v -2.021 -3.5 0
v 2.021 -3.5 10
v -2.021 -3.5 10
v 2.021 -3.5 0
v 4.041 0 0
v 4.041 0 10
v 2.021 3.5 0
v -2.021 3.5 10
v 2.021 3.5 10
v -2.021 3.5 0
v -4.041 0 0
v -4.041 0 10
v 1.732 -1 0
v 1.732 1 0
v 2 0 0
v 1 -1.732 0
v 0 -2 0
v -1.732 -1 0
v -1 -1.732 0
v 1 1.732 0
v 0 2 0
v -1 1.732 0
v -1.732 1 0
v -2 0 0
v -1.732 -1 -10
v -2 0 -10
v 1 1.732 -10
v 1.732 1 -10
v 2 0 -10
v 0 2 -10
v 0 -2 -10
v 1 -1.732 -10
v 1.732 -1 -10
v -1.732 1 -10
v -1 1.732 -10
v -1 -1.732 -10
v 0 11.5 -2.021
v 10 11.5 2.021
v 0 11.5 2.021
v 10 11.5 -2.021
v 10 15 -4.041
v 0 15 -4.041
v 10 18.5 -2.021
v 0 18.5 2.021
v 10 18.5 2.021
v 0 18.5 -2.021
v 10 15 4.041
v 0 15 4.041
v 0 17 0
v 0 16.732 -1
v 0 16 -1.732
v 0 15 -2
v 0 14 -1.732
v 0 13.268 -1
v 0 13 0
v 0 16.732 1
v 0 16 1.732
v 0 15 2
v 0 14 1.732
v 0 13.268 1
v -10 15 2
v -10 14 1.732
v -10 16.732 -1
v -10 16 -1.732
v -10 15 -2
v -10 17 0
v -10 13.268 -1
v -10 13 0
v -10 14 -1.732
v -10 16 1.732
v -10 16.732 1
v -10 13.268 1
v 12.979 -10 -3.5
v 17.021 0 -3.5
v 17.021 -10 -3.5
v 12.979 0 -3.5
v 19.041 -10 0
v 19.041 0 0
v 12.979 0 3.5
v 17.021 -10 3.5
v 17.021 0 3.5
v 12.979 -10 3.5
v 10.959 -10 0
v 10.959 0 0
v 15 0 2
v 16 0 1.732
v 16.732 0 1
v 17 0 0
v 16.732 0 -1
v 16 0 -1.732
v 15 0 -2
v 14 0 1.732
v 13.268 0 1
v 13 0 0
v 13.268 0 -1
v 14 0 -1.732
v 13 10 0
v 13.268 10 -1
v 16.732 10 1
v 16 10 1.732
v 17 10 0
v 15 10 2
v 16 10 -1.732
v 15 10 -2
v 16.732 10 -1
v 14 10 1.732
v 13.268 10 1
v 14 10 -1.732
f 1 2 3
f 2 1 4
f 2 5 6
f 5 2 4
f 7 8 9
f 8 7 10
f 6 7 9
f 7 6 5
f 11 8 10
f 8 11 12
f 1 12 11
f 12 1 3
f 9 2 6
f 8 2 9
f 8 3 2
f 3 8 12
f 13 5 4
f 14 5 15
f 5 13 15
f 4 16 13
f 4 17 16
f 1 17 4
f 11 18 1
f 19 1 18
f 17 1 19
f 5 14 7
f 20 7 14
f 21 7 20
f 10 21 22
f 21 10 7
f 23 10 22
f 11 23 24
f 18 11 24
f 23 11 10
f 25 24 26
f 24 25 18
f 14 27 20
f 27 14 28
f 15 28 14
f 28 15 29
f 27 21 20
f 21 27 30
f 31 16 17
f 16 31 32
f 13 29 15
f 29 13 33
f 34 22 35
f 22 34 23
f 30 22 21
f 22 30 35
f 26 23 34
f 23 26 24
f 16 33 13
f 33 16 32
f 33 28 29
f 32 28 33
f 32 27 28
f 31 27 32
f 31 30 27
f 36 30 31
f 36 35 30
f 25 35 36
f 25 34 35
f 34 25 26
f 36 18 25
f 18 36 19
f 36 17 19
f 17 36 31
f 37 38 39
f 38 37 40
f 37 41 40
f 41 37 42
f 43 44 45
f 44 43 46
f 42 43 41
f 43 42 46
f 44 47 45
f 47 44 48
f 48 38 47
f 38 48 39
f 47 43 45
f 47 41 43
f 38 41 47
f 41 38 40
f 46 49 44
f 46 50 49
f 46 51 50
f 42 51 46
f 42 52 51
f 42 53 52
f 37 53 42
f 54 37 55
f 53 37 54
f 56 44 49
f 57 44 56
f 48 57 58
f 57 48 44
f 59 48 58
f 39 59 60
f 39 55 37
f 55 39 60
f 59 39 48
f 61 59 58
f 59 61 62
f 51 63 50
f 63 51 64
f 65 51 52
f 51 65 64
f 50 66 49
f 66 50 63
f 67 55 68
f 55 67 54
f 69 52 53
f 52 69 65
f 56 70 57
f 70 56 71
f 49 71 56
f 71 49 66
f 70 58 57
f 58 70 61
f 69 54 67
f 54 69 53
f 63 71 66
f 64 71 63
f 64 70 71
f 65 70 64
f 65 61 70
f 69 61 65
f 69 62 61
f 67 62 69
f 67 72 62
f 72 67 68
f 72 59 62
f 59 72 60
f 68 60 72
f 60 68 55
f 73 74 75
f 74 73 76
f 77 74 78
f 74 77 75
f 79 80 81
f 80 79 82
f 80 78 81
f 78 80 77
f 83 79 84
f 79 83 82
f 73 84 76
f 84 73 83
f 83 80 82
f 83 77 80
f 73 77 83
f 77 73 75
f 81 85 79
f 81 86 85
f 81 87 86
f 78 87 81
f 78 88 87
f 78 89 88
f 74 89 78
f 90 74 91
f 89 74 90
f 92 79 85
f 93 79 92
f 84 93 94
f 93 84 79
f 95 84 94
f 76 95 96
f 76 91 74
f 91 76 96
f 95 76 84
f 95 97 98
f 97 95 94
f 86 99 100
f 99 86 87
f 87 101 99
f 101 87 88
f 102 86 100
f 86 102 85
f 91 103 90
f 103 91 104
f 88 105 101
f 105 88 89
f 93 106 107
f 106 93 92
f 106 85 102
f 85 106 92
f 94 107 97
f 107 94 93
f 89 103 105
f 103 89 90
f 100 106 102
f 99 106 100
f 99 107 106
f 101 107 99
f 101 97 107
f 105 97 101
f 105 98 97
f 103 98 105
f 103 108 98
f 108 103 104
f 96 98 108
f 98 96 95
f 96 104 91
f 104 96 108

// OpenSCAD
// Vertical nut recess with base of nut centred on origin 
//
// af = nut size accross faces
// oh = overall height (screw + head + recesss)
// sd = screw diameter
// sh = screw height (to shoulder of nut recess)
module nutrecessZ(od, oh, sd, sh)
{
  sin60 = sin(60);
  union()
  {
    // % translate([0,0,oh-sh]) cylinder(r=od/sin60/2, h=5, $fn=12);
    // Square shoulder...
    //cylinder(r=od/sin60/2, h=oh-sh, $fn=6);
    // Angle shoulder at 45deg for printing...
    intersection()
    {
        translate([0,0,0]) cylinder(r=od/sin60/2, h=oh-sh, $fn=6);
        //translate([0,0,-((od/2)-(sd/2))/2])
        //  cylinder(r1=sd/2, r2=sd/2+(oh-sh), h=oh-sh, $fn=12);
    }
    translate([0,0,-sh]) cylinder(r=sd/2, h=oh, $fn=12);
  }
}

// Nut recess with screw directed along negative X-axis
module nutrecessX(od, oh, sd, sh)
{
    rotate([0,90,0]) nutrecessZ(od, oh, sd, sh);
}

// Nut recess with screw directed along negative Y-axis
module nutrecessY(od, oh, sd, sh)
{
    rotate([90,0,0]) nutrecessZ(od, oh, sd, sh);
}


// Examples
nutrecessZ(7, 20, 4, 10);

translate([0,15,0]) nutrecessX(7, 20, 4, 10);

translate([15,0,0]) nutrecessY(7, 20, 4, 10);
